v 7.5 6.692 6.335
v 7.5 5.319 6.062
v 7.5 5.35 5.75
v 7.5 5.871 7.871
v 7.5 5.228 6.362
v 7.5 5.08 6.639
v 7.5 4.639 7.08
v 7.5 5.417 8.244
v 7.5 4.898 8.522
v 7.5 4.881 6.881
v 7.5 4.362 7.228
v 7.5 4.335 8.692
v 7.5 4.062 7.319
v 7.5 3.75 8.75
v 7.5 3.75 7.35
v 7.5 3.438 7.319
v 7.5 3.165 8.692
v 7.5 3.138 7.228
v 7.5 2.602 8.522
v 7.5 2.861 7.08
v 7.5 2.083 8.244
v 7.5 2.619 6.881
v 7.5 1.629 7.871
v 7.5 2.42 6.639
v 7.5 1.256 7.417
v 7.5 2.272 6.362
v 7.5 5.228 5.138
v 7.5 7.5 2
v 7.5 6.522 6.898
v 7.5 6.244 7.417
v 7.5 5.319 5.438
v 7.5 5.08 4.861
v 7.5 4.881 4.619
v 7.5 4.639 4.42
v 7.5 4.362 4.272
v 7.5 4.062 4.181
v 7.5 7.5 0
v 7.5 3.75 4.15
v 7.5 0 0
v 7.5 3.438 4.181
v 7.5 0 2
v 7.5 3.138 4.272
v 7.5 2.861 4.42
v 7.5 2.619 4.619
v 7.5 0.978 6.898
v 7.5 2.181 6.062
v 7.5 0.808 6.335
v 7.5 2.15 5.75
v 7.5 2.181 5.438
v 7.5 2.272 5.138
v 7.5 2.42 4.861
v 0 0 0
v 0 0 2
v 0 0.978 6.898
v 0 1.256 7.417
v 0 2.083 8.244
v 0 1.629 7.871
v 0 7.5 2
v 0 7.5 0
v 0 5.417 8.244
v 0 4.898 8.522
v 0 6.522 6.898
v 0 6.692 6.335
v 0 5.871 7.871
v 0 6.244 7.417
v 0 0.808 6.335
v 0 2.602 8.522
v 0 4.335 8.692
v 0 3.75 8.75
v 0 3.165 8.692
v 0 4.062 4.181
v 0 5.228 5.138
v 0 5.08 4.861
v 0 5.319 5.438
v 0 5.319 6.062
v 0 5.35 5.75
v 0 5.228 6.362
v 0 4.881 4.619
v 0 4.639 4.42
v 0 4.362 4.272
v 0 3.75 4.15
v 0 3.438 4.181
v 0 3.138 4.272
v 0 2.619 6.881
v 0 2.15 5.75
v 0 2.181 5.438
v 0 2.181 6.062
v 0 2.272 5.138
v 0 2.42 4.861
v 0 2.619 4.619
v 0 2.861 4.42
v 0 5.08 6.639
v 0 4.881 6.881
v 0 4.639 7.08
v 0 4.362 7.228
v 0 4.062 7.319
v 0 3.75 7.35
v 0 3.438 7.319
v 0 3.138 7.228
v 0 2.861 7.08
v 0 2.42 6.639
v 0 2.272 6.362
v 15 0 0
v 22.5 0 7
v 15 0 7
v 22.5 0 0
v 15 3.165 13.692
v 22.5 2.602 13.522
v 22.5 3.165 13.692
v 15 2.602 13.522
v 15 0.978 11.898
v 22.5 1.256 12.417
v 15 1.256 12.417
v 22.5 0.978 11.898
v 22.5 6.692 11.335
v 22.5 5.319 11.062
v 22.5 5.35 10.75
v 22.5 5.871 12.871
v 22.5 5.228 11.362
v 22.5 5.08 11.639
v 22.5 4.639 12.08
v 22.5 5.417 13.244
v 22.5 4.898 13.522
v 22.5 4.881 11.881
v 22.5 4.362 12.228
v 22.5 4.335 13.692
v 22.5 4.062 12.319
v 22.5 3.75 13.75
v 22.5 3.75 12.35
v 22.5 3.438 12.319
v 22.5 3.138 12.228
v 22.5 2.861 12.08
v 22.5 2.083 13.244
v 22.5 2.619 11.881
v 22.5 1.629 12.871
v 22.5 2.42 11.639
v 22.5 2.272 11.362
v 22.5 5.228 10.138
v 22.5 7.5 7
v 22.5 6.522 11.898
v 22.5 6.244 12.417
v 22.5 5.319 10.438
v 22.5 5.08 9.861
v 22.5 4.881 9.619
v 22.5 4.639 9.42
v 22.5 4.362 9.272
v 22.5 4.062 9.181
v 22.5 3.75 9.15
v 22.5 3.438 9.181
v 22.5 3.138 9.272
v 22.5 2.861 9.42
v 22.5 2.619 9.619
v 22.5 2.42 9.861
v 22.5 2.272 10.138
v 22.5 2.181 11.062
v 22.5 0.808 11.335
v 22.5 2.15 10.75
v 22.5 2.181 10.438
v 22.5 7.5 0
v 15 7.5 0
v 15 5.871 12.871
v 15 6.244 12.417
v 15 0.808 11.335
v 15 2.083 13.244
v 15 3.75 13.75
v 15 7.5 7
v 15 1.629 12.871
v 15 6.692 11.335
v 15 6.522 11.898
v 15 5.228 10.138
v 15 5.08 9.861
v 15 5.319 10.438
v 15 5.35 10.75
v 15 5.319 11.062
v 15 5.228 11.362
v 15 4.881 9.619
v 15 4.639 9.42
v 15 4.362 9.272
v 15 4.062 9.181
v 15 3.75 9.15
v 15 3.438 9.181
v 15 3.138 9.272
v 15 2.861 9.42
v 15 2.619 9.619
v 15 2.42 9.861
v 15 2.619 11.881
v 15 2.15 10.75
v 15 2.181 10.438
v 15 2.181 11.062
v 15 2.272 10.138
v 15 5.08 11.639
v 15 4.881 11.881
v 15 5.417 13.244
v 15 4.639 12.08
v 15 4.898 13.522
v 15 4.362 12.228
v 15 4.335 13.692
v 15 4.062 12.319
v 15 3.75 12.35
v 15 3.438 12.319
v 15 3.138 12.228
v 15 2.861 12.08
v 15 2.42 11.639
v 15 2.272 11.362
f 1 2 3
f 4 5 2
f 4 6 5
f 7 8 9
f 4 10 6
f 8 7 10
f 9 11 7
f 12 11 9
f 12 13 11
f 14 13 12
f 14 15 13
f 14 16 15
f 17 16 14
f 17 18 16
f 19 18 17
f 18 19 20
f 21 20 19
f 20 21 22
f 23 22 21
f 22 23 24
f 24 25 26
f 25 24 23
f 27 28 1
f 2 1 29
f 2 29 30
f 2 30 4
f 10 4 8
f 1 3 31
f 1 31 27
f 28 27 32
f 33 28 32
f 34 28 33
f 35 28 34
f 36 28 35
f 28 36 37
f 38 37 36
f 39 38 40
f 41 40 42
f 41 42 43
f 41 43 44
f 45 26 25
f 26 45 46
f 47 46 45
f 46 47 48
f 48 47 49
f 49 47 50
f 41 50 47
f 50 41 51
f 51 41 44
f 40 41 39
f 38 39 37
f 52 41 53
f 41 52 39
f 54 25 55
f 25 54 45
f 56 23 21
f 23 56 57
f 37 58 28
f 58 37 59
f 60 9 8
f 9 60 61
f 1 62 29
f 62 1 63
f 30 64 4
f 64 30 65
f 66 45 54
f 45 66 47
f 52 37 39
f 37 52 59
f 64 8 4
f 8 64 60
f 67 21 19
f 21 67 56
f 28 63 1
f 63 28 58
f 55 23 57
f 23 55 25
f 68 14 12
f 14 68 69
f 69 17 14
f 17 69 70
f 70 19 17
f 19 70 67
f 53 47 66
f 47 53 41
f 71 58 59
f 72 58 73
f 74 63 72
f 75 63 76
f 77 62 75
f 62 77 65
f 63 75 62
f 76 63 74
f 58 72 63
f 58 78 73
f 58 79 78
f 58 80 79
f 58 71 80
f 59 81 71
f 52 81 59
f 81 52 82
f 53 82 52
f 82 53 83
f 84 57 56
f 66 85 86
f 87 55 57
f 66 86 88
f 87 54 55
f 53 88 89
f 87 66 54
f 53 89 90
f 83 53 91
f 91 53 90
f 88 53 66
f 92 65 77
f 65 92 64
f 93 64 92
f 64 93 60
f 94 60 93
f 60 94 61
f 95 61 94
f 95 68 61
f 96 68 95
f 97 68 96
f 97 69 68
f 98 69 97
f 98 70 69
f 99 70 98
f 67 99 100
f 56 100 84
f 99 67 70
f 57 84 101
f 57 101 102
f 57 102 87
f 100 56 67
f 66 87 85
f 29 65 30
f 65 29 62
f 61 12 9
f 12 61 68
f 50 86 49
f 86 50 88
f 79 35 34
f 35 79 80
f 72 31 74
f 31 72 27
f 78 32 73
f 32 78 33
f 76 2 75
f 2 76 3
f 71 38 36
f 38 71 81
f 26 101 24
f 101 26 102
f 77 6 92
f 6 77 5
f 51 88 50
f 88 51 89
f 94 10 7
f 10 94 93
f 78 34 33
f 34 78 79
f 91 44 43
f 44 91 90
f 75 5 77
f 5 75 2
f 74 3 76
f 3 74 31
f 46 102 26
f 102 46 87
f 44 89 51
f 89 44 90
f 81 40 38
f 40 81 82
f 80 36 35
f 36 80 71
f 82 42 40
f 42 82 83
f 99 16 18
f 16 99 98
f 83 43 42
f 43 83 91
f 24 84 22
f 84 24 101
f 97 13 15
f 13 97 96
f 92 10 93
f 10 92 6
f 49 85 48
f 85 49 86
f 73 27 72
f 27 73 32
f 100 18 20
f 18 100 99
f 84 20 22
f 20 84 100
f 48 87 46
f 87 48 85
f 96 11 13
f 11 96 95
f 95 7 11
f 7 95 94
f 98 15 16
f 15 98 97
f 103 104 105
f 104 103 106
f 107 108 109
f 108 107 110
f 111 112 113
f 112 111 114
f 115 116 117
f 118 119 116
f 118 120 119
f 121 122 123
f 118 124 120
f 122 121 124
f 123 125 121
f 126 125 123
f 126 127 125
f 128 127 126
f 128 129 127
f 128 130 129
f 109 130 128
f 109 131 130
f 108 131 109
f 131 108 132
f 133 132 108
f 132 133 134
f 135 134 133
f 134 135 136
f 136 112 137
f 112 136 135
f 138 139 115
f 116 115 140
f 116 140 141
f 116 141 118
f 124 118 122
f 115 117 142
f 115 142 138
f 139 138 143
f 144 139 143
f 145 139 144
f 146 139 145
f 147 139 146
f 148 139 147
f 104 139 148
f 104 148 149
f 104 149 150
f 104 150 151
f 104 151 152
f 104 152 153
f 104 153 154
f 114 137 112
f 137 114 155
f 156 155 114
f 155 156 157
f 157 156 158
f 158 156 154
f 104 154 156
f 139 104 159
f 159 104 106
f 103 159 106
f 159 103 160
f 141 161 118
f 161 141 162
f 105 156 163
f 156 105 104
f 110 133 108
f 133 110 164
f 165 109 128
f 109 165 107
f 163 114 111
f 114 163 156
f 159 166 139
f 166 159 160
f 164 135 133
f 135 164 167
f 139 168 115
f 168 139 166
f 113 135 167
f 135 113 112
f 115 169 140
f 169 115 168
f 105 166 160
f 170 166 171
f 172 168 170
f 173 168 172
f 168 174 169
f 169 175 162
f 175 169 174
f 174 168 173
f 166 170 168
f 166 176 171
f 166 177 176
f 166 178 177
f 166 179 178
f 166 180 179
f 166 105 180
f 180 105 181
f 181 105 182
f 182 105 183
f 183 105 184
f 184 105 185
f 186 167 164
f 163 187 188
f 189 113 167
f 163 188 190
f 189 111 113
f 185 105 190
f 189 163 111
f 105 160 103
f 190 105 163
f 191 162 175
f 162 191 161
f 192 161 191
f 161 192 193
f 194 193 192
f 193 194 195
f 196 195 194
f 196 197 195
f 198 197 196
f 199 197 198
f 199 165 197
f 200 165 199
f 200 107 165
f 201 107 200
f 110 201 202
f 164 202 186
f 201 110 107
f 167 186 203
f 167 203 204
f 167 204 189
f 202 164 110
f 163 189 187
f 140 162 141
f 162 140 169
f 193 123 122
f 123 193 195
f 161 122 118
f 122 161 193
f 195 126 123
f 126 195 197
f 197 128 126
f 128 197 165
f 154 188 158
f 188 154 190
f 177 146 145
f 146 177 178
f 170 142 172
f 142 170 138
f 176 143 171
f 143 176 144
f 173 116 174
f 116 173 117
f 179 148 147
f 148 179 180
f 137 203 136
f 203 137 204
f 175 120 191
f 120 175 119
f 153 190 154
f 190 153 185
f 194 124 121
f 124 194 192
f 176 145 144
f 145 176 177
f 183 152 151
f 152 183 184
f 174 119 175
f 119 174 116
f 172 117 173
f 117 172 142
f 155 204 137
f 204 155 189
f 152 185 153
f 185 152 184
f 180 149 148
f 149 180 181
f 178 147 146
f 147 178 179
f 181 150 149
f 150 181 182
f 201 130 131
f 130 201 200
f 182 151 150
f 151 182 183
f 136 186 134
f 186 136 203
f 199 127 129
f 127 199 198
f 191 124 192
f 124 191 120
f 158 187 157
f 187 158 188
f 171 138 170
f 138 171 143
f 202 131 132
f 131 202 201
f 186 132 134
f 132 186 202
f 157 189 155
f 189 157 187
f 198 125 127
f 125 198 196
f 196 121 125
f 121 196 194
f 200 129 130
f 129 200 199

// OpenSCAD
use <../nscad-lib.scad>

color("orange") schamier();
color("steelblue") move(15) schamier(h = 5);
